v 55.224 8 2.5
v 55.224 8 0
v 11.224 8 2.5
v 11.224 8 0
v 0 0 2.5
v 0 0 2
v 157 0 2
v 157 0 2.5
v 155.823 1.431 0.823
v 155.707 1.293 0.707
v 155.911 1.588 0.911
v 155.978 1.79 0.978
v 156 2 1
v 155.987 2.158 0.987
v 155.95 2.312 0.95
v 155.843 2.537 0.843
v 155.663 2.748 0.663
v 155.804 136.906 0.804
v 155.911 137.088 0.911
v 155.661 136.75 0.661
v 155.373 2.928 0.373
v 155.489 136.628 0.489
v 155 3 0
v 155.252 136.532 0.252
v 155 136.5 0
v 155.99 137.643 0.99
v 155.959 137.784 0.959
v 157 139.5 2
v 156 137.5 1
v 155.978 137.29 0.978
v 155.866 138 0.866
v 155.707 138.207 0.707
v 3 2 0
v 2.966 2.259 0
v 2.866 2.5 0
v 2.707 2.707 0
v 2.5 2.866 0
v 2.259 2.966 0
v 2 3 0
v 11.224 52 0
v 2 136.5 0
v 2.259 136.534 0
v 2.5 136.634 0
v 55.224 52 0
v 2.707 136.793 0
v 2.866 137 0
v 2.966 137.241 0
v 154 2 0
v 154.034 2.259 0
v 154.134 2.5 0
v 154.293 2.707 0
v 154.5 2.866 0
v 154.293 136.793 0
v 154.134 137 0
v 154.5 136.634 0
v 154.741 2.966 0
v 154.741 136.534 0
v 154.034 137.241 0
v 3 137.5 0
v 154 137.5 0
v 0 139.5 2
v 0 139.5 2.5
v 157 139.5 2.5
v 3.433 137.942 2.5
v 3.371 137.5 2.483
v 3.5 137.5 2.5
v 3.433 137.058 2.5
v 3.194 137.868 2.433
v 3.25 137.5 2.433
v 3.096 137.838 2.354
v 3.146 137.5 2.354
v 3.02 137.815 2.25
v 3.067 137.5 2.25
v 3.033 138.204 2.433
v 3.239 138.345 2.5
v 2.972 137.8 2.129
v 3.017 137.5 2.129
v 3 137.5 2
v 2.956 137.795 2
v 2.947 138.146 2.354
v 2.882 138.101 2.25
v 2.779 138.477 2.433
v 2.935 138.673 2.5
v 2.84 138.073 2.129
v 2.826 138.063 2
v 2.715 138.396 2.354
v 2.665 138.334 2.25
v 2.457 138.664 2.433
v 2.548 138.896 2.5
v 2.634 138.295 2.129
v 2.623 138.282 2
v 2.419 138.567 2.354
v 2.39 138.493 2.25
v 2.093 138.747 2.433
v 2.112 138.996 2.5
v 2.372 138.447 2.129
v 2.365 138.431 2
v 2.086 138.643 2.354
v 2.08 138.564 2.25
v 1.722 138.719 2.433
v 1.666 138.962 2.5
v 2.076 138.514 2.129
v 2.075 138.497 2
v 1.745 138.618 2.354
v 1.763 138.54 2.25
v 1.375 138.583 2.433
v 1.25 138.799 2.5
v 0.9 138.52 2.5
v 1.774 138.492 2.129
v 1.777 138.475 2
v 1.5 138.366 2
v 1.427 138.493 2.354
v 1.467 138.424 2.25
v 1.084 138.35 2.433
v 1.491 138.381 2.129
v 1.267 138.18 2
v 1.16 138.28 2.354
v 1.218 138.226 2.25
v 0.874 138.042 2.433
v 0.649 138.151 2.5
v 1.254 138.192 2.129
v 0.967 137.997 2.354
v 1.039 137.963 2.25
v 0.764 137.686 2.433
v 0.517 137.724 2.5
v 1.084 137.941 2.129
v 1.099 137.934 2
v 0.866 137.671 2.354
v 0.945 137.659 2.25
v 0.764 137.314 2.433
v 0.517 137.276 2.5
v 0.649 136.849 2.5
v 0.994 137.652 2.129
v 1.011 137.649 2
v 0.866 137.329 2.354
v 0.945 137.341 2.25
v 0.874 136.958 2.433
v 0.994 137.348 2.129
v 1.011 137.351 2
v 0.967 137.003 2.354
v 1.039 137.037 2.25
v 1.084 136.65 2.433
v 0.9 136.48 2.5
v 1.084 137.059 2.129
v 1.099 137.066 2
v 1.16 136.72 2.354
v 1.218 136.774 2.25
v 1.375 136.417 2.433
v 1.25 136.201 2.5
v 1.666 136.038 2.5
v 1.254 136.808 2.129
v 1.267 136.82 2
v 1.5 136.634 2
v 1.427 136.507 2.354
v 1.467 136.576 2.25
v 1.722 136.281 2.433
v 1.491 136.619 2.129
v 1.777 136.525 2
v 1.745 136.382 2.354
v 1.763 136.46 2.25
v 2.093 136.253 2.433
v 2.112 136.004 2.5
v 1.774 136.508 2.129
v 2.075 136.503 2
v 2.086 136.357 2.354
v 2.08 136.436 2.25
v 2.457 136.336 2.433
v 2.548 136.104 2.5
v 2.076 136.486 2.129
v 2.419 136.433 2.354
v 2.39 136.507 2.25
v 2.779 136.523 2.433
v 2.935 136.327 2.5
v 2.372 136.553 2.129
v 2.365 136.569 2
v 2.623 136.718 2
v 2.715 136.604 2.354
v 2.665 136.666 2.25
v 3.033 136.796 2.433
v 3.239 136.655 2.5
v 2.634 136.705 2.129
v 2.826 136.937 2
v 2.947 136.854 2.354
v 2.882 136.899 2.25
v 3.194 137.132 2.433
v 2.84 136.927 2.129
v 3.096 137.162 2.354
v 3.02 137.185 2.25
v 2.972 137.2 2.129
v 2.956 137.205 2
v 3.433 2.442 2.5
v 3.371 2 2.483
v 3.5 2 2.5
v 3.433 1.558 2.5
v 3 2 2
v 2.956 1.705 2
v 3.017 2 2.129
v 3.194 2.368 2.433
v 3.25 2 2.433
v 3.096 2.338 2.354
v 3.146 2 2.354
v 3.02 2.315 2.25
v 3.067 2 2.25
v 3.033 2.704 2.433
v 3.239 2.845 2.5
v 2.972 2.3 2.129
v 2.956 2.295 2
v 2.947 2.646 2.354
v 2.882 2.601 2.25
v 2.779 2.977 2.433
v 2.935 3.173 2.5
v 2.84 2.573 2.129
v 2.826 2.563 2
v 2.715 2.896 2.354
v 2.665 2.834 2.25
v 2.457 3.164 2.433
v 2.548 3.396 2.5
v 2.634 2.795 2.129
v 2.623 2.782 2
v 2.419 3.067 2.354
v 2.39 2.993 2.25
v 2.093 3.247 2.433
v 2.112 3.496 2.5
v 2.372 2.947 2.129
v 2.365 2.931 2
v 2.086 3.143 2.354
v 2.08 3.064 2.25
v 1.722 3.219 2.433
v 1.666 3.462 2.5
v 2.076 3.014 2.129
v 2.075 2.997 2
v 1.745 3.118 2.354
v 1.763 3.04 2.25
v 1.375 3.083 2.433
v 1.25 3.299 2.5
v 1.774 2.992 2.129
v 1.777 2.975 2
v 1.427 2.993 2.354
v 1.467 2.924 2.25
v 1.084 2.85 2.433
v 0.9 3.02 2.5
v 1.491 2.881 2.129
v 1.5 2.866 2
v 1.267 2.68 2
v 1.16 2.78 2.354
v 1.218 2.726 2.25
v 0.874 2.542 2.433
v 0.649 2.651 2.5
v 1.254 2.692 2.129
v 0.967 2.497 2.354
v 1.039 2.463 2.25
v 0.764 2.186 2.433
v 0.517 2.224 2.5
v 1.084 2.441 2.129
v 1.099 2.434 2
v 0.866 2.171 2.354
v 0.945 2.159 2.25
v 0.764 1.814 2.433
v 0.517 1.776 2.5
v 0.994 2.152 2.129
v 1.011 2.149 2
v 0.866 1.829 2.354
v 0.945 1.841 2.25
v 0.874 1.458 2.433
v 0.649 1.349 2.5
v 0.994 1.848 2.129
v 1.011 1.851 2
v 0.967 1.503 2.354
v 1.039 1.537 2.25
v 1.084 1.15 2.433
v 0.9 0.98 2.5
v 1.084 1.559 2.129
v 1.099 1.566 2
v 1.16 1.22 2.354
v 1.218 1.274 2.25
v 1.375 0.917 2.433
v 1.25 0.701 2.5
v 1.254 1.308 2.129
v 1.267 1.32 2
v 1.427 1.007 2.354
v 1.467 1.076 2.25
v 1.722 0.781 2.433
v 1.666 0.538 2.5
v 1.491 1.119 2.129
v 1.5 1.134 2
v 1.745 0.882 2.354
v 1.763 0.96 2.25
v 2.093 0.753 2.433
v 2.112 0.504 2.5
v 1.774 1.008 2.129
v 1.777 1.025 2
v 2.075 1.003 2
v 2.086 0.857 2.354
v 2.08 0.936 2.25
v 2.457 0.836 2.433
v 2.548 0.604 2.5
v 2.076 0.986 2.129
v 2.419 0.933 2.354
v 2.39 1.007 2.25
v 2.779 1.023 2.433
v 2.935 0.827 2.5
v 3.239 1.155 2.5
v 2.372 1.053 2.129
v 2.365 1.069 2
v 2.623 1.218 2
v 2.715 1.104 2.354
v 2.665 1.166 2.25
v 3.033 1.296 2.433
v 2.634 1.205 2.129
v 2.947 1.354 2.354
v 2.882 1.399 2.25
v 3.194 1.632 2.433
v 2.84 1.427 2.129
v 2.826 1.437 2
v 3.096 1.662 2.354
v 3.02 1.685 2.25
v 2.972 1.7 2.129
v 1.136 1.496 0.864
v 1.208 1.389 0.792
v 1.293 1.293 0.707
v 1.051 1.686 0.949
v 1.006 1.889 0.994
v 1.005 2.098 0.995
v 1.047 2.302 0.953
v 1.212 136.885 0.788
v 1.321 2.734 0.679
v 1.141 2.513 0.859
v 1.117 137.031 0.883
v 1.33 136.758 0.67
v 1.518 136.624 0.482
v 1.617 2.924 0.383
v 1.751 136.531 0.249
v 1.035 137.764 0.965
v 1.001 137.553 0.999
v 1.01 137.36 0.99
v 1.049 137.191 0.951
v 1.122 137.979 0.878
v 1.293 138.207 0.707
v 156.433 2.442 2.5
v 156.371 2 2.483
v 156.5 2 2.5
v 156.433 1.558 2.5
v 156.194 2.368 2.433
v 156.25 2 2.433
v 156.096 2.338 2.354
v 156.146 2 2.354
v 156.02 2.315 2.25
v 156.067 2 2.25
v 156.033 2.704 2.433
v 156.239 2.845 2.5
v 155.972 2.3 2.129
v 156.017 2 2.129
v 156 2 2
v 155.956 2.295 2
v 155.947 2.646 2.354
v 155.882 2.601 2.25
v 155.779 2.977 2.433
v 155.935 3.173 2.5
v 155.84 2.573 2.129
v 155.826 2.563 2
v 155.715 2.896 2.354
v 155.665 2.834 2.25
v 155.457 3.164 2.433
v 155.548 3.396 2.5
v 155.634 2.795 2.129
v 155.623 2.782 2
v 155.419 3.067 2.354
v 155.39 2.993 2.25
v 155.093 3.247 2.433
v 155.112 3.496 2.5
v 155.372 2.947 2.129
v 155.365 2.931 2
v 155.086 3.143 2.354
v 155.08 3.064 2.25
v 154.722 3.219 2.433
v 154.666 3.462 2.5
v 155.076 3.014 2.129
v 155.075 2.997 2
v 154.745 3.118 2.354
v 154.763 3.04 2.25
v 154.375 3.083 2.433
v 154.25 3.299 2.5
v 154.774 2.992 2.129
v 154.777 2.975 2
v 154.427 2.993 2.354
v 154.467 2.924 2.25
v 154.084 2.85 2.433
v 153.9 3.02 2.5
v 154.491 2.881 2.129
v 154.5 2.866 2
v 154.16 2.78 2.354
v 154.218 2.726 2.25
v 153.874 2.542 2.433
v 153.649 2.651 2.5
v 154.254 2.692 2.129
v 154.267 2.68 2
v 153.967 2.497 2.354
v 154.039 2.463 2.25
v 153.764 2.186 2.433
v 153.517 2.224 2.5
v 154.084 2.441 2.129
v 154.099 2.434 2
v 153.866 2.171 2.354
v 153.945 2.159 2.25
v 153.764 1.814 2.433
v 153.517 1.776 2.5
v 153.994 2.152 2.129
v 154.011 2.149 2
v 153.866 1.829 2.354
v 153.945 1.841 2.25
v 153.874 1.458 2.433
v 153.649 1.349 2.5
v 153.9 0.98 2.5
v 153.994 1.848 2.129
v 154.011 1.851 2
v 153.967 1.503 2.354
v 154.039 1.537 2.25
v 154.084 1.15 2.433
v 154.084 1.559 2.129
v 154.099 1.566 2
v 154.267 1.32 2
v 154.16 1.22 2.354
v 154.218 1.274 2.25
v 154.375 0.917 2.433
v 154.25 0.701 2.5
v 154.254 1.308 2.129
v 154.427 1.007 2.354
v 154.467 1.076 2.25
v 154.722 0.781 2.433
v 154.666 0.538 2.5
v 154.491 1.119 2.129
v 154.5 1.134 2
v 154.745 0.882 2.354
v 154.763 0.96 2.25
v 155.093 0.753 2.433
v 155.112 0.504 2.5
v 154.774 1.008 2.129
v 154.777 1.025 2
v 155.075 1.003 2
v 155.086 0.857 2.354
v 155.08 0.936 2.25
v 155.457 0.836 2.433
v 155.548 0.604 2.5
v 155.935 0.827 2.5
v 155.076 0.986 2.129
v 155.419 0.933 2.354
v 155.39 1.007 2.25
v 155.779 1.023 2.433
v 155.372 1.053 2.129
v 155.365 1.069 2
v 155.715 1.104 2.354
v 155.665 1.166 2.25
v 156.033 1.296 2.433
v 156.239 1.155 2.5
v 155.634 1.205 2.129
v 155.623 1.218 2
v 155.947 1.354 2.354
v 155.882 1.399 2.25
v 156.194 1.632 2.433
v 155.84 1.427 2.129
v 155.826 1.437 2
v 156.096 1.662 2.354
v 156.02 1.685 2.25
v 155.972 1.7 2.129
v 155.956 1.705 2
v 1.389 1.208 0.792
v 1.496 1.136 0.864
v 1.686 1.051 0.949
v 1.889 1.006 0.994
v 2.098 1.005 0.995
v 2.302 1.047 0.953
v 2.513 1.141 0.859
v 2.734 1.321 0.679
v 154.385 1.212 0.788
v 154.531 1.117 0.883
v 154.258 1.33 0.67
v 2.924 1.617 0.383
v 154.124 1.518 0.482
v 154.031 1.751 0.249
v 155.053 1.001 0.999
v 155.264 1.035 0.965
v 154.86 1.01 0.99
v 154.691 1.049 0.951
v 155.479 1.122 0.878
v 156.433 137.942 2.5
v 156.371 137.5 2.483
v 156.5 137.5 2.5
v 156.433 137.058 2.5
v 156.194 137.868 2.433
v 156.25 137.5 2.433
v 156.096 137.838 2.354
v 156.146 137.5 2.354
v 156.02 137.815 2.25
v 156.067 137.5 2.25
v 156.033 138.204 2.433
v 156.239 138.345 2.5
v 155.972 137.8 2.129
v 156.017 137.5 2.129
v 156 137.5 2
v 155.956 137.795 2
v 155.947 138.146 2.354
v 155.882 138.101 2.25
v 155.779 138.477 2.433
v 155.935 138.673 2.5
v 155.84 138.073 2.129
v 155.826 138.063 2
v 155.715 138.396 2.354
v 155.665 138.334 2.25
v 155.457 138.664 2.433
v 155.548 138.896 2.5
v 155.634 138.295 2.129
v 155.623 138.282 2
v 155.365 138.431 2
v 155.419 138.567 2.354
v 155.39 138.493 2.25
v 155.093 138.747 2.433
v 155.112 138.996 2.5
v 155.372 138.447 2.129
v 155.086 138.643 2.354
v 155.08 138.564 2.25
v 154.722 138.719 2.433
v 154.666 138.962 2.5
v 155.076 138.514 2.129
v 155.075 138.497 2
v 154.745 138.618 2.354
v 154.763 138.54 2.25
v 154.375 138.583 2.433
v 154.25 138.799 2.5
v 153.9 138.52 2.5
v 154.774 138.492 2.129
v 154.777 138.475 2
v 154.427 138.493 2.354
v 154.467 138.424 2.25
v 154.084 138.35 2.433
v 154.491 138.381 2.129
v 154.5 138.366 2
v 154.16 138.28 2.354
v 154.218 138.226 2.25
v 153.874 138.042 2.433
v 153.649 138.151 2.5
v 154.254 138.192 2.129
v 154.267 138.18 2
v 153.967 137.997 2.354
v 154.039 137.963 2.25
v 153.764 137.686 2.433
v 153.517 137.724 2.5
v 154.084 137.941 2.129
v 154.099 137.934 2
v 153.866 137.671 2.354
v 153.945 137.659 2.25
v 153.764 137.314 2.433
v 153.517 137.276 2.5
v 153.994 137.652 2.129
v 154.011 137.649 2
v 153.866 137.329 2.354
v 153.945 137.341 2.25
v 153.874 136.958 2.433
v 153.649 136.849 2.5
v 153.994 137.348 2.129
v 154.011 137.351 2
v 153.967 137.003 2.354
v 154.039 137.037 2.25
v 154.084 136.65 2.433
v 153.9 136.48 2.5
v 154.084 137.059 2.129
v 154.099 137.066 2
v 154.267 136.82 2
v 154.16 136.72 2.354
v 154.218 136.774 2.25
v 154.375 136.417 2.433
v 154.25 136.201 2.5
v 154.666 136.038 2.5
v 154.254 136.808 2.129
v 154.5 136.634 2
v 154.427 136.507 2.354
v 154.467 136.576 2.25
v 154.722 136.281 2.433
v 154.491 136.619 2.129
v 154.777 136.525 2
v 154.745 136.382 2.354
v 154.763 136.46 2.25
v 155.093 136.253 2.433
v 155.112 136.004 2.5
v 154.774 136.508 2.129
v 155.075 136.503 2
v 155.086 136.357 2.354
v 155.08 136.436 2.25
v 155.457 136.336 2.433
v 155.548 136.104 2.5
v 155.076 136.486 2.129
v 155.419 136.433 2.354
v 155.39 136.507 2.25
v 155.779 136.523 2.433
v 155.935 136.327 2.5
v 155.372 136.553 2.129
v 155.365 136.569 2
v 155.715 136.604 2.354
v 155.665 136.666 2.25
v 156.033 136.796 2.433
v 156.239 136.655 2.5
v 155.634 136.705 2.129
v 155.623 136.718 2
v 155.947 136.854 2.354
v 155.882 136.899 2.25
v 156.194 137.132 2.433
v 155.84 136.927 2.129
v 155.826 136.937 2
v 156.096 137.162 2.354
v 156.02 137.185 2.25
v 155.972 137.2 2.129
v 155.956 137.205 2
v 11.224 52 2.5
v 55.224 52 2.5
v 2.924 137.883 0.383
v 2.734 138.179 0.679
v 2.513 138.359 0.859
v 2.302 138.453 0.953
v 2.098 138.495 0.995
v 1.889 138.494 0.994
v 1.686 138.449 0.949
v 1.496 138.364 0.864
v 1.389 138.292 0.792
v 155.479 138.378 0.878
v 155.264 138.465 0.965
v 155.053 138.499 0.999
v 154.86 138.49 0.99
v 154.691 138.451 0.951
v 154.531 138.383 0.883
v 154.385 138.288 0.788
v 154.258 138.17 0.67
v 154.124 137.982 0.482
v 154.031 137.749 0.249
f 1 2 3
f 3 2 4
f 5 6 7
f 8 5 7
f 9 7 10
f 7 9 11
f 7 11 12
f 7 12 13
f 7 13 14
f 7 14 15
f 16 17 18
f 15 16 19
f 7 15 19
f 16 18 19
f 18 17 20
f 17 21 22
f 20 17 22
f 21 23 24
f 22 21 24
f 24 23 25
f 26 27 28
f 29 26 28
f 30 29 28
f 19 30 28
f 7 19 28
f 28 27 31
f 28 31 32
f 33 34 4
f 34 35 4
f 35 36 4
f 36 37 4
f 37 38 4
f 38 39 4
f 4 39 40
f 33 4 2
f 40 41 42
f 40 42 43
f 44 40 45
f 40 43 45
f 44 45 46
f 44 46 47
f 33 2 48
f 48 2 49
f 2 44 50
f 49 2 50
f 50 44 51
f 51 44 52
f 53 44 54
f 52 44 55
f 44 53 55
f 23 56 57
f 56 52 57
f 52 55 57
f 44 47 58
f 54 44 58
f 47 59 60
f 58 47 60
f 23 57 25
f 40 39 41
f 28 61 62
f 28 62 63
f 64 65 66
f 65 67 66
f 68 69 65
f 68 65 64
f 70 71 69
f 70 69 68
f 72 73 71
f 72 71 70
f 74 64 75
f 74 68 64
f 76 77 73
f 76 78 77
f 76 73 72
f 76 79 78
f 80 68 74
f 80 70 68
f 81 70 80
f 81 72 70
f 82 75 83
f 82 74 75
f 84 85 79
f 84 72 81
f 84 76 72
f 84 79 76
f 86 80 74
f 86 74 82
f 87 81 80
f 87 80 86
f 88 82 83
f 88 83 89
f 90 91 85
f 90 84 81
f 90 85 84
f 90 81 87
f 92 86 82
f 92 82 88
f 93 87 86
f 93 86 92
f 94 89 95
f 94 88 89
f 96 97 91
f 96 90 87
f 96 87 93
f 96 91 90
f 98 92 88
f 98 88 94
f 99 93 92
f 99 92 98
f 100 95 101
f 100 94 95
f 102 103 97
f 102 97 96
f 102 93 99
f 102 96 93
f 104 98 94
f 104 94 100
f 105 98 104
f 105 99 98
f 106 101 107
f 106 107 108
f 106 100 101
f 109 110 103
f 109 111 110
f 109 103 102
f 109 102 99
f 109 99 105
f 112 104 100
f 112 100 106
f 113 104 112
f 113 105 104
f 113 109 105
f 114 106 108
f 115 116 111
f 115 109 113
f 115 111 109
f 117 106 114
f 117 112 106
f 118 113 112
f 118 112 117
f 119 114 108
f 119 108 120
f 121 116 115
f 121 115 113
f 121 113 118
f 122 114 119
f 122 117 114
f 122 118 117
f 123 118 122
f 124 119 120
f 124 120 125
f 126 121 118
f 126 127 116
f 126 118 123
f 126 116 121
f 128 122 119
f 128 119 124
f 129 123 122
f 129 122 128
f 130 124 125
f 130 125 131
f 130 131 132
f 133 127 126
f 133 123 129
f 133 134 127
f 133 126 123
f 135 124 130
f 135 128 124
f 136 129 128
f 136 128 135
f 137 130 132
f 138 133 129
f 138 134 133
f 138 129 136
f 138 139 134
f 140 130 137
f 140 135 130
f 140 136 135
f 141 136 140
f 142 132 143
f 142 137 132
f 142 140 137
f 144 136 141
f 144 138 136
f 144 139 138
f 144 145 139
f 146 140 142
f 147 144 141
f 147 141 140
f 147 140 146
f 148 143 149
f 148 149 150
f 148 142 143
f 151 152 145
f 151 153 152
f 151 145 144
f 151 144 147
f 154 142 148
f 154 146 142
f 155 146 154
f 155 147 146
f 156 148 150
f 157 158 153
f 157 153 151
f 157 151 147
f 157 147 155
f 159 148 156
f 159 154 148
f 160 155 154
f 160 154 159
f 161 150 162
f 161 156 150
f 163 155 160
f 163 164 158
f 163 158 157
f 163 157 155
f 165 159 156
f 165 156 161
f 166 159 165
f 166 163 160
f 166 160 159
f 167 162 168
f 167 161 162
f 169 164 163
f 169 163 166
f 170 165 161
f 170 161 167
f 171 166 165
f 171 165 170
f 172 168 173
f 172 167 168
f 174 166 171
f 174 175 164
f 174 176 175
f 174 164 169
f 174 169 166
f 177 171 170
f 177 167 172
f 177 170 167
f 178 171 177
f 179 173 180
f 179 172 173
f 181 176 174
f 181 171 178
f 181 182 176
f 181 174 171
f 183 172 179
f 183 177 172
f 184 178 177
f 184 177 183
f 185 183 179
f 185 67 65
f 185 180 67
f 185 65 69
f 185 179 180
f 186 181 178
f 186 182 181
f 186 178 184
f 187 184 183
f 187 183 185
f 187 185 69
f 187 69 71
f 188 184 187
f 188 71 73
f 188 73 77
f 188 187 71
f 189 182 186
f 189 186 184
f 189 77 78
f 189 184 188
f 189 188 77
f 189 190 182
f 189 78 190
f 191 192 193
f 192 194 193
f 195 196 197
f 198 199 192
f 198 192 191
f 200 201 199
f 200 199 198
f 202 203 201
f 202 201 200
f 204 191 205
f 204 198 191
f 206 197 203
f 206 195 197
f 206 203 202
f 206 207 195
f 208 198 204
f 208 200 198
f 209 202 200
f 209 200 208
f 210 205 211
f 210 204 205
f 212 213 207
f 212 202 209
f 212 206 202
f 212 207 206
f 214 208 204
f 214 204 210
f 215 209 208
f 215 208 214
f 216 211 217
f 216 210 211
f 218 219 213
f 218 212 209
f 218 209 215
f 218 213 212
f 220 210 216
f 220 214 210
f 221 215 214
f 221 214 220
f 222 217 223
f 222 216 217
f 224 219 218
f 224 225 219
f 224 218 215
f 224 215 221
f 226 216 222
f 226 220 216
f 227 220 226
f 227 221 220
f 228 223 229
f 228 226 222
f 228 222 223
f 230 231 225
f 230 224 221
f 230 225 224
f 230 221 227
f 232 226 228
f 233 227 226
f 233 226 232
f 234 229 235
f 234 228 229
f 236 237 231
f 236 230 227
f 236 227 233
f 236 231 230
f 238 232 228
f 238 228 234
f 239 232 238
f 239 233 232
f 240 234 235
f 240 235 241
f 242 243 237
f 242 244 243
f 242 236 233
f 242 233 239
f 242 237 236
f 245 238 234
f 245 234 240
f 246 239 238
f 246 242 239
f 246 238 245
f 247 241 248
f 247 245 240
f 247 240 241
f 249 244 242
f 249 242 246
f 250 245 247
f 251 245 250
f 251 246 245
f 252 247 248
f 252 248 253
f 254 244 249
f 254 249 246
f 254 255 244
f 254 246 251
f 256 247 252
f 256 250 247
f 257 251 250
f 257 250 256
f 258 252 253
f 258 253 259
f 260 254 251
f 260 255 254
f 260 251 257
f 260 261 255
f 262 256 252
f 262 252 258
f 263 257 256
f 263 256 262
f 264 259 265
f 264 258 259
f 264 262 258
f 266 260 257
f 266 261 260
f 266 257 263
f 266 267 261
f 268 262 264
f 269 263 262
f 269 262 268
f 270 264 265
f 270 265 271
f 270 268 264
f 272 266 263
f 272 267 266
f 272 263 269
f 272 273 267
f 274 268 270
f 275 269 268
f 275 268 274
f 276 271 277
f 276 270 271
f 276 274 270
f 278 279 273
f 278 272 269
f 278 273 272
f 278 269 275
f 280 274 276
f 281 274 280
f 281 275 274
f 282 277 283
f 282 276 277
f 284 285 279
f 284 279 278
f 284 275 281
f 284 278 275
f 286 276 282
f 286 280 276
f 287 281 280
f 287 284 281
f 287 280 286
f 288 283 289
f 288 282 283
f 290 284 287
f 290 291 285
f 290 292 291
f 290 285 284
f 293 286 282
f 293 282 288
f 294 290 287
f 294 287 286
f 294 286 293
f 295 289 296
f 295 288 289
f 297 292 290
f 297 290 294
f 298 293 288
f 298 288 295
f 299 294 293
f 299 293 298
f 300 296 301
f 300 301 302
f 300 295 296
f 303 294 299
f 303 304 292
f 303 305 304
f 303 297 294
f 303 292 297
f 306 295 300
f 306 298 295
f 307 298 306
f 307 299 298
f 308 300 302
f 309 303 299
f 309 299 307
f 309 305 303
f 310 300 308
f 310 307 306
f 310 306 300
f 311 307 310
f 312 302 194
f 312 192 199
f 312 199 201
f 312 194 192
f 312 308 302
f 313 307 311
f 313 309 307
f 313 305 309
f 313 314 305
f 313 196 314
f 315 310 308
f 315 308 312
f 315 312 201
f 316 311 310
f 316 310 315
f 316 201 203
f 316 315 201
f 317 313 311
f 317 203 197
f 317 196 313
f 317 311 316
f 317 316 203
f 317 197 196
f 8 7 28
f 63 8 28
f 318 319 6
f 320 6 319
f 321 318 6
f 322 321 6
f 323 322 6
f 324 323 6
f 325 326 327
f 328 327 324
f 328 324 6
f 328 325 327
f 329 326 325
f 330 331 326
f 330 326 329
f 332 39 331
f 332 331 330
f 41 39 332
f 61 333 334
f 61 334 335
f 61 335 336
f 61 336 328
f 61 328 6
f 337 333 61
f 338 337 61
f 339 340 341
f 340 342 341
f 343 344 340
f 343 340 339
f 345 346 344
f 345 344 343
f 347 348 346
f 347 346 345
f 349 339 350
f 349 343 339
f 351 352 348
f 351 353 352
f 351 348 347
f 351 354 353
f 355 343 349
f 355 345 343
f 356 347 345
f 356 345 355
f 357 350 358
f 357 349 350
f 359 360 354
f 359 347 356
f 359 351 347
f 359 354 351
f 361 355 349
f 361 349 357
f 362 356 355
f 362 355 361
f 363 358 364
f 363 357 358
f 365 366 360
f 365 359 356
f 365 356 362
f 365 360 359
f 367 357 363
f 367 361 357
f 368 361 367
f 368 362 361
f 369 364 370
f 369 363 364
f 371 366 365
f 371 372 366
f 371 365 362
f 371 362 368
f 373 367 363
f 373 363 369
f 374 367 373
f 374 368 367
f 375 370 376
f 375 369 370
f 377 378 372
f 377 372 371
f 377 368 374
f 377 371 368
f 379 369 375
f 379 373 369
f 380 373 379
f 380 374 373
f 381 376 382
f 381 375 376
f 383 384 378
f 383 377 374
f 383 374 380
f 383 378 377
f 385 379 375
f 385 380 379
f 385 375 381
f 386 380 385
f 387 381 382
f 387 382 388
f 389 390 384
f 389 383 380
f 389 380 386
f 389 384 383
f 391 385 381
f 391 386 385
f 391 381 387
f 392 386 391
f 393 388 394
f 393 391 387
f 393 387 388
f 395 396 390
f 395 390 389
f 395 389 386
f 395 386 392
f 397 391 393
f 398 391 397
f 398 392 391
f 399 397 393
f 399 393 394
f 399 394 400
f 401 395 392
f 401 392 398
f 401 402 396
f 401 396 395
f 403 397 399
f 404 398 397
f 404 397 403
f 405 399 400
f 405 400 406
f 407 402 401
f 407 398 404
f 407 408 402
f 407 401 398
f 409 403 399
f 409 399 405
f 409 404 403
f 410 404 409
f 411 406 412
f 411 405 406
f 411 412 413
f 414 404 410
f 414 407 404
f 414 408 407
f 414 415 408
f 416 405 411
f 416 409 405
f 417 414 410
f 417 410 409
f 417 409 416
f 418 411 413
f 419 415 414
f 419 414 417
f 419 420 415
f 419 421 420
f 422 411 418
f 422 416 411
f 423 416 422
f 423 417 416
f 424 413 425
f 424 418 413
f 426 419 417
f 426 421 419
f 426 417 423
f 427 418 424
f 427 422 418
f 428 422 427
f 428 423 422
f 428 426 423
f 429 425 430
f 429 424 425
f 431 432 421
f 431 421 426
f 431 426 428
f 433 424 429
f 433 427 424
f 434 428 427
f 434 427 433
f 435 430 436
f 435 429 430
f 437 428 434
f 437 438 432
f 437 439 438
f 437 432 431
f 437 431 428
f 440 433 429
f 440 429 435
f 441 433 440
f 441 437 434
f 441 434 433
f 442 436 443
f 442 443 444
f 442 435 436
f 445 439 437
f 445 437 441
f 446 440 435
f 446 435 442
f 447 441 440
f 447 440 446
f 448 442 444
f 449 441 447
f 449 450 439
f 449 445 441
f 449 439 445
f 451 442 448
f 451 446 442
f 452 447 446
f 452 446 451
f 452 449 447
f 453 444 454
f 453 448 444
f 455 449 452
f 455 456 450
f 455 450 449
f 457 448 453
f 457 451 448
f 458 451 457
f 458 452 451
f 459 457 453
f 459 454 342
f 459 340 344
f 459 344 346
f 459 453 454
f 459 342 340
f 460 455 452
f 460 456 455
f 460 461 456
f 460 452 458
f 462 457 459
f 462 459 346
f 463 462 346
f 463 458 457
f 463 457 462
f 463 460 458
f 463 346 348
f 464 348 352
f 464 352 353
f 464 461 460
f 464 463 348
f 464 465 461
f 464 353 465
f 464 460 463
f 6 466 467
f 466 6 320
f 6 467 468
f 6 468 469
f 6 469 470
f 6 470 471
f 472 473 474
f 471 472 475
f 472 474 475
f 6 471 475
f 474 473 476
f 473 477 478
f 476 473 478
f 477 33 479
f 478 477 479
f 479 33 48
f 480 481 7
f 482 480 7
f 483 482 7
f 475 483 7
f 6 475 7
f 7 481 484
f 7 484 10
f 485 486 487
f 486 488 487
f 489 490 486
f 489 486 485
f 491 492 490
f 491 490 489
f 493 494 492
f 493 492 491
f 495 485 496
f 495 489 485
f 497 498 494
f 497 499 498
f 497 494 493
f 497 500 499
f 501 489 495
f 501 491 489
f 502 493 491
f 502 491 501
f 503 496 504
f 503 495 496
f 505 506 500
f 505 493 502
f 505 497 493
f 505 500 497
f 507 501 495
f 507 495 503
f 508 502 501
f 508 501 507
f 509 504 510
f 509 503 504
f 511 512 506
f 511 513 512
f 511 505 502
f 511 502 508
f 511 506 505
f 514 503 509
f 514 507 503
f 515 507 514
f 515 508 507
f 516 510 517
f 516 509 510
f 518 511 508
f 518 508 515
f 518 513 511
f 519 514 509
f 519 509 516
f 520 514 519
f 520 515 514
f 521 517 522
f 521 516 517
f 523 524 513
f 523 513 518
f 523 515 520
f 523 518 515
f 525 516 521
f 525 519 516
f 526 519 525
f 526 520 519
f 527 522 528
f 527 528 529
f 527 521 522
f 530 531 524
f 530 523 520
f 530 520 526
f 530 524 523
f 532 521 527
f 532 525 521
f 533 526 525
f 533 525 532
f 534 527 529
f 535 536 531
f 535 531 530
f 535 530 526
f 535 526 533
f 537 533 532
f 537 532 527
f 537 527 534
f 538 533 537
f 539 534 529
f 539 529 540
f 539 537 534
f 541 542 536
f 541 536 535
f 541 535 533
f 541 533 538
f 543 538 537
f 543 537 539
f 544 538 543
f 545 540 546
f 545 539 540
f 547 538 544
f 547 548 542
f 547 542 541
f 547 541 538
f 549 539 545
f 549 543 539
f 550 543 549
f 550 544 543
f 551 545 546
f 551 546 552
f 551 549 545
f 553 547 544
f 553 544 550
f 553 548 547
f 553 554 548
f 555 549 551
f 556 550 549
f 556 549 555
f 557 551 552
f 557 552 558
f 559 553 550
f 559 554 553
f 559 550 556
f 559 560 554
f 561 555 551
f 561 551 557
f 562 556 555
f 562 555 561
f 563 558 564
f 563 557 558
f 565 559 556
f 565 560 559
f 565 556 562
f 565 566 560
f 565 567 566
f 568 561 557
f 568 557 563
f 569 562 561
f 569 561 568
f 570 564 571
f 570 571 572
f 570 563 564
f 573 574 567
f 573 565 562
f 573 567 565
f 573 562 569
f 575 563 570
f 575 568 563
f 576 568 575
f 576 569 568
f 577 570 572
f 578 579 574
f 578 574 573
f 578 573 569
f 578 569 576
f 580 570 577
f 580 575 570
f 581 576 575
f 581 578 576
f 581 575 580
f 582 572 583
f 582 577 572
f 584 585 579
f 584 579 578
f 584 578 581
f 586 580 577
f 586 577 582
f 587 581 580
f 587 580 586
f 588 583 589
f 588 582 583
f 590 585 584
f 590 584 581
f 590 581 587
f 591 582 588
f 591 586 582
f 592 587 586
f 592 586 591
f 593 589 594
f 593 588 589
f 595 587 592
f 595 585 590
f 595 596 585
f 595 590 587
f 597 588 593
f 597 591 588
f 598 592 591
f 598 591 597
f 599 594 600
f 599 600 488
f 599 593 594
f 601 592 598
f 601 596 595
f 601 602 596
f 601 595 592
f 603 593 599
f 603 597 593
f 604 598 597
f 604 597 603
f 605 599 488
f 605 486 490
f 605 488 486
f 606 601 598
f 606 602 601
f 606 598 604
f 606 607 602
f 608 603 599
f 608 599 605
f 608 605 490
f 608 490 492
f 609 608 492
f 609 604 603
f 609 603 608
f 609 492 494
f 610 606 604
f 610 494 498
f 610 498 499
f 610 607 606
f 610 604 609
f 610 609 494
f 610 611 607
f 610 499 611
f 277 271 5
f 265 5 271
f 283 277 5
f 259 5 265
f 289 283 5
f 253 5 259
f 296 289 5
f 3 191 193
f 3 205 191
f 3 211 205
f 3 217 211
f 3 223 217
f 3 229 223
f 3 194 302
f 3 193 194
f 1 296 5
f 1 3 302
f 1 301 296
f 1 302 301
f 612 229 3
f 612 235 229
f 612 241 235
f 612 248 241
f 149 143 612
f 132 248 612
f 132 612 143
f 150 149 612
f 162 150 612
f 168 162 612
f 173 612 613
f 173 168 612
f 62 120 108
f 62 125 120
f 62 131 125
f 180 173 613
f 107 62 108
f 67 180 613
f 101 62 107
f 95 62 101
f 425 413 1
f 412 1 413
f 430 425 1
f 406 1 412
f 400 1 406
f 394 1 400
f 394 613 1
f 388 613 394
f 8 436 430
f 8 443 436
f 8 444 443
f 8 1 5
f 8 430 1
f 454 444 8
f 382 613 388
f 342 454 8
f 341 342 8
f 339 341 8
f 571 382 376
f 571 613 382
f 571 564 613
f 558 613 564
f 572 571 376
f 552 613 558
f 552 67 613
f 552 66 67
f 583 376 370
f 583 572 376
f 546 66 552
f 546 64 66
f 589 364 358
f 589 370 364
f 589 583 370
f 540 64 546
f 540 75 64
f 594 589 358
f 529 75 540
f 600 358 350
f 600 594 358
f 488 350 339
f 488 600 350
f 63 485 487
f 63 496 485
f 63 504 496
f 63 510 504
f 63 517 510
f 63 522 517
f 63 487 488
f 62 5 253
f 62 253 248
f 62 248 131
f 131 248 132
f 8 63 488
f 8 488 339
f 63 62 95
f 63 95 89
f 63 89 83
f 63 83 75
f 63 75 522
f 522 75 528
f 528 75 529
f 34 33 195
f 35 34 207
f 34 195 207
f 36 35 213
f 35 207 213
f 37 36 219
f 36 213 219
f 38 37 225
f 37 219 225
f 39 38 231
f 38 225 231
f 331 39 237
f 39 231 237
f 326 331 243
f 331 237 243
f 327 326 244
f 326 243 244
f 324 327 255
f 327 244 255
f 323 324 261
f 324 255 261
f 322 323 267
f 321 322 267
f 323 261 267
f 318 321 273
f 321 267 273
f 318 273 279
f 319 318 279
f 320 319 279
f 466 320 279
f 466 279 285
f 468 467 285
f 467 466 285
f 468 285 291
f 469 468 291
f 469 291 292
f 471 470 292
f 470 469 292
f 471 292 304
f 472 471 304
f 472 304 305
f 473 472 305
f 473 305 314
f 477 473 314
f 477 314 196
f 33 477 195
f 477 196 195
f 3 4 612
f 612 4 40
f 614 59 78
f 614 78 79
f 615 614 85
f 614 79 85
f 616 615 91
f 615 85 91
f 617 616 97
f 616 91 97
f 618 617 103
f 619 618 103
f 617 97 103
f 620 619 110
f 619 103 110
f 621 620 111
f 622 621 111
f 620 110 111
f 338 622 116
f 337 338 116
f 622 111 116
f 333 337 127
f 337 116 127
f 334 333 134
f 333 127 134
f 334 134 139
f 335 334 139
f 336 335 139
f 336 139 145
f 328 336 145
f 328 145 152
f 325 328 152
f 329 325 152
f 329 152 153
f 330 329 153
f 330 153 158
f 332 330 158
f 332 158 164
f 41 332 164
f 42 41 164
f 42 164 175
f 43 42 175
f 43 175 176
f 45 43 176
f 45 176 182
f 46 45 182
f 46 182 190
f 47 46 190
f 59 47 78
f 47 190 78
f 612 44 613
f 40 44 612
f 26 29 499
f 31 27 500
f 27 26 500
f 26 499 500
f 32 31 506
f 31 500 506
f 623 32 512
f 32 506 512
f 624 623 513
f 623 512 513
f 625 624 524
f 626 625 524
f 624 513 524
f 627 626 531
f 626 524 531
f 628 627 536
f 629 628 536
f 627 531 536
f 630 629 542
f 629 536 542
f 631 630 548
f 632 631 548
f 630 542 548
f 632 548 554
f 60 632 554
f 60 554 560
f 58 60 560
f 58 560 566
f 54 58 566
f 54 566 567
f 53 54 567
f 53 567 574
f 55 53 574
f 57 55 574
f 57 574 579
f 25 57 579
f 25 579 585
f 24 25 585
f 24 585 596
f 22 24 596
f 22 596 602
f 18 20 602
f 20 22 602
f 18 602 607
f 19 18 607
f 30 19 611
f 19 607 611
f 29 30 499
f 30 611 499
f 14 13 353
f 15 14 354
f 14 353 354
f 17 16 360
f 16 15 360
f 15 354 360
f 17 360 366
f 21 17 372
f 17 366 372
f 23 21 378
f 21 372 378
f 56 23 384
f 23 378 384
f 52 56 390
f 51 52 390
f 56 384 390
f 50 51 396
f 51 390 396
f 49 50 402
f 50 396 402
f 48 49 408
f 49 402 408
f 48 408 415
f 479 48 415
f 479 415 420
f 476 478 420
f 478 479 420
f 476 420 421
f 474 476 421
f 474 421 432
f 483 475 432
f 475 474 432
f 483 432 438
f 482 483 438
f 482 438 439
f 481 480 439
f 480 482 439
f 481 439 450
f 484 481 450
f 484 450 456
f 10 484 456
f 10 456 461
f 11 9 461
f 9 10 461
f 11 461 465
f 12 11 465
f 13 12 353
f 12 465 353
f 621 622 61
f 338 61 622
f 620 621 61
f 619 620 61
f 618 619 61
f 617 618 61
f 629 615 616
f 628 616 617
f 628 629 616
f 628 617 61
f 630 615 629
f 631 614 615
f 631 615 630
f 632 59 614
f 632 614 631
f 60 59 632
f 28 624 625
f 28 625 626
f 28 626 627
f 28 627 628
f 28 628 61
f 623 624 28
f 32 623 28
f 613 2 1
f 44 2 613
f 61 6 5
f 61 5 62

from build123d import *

# Parameters (mm, degrees)
SKETCH1_W           = 157
SKETCH1_H           = 139.5
BOSS_EXTRUDE1_DEPTH = 2.5
CHAMFER1_SIZE       = 2
SKETCH5_W           = 44
SKETCH5_H           = 44
CUT_EXTRUDE1_DEPTH  = 10
SKETCH6_R           = 1
CUT_EXTRUDE2_DEPTH  = 10
FILLET1_R           = 0.5


with BuildPart() as part:
    # Sketch1 → Boss-Extrude1 (new body)
    with BuildSketch(Plane.XY):
        with Locations((78.5, 69.75)):
            Rectangle(SKETCH1_W, SKETCH1_H)
    extrude(amount=BOSS_EXTRUDE1_DEPTH)

    # Chamfer1
    chamfer1_edges = [part.edges().sort_by_distance(p)[0] for p in [
        (78.5, 139.5, 0),
        (157, 69.75, 0),
        (78.5, 0, 0),
        (0, 69.75, 0),
    ]]
    chamfer(chamfer1_edges, length=CHAMFER1_SIZE)

    # Sketch5 → Cut-Extrude1 (cut)
    with BuildSketch(Plane(origin=(0, 0, 0), x_dir=(-1, 0, 0), z_dir=(0, 0, -1))):
        with Locations((-33.223972079, 30)):
            Rectangle(SKETCH5_W, SKETCH5_H)
    extrude(amount=-CUT_EXTRUDE1_DEPTH, mode=Mode.SUBTRACT)

    # Sketch6 → Cut-Extrude2 (cut)
    with BuildSketch(Plane.XY.offset(2.5)):
        with Locations((155, 137.5)):
            Circle(SKETCH6_R)
        with Locations((2, 137.5)):
            Circle(SKETCH6_R)
        with Locations((155, 2)):
            Circle(SKETCH6_R)
        with Locations((2, 2)):
            Circle(SKETCH6_R)
    extrude(amount=-CUT_EXTRUDE2_DEPTH, mode=Mode.SUBTRACT)

    # Fillet1
    fillet1_edges = [part.edges().sort_by_distance(p)[0] for p in [
        (154, 2, 2.5),
        (154, 137.5, 2.5),
        (1, 137.5, 2.5),
        (1, 2, 2.5),
    ]]
    fillet(fillet1_edges, radius=FILLET1_R)


solid = part.part
